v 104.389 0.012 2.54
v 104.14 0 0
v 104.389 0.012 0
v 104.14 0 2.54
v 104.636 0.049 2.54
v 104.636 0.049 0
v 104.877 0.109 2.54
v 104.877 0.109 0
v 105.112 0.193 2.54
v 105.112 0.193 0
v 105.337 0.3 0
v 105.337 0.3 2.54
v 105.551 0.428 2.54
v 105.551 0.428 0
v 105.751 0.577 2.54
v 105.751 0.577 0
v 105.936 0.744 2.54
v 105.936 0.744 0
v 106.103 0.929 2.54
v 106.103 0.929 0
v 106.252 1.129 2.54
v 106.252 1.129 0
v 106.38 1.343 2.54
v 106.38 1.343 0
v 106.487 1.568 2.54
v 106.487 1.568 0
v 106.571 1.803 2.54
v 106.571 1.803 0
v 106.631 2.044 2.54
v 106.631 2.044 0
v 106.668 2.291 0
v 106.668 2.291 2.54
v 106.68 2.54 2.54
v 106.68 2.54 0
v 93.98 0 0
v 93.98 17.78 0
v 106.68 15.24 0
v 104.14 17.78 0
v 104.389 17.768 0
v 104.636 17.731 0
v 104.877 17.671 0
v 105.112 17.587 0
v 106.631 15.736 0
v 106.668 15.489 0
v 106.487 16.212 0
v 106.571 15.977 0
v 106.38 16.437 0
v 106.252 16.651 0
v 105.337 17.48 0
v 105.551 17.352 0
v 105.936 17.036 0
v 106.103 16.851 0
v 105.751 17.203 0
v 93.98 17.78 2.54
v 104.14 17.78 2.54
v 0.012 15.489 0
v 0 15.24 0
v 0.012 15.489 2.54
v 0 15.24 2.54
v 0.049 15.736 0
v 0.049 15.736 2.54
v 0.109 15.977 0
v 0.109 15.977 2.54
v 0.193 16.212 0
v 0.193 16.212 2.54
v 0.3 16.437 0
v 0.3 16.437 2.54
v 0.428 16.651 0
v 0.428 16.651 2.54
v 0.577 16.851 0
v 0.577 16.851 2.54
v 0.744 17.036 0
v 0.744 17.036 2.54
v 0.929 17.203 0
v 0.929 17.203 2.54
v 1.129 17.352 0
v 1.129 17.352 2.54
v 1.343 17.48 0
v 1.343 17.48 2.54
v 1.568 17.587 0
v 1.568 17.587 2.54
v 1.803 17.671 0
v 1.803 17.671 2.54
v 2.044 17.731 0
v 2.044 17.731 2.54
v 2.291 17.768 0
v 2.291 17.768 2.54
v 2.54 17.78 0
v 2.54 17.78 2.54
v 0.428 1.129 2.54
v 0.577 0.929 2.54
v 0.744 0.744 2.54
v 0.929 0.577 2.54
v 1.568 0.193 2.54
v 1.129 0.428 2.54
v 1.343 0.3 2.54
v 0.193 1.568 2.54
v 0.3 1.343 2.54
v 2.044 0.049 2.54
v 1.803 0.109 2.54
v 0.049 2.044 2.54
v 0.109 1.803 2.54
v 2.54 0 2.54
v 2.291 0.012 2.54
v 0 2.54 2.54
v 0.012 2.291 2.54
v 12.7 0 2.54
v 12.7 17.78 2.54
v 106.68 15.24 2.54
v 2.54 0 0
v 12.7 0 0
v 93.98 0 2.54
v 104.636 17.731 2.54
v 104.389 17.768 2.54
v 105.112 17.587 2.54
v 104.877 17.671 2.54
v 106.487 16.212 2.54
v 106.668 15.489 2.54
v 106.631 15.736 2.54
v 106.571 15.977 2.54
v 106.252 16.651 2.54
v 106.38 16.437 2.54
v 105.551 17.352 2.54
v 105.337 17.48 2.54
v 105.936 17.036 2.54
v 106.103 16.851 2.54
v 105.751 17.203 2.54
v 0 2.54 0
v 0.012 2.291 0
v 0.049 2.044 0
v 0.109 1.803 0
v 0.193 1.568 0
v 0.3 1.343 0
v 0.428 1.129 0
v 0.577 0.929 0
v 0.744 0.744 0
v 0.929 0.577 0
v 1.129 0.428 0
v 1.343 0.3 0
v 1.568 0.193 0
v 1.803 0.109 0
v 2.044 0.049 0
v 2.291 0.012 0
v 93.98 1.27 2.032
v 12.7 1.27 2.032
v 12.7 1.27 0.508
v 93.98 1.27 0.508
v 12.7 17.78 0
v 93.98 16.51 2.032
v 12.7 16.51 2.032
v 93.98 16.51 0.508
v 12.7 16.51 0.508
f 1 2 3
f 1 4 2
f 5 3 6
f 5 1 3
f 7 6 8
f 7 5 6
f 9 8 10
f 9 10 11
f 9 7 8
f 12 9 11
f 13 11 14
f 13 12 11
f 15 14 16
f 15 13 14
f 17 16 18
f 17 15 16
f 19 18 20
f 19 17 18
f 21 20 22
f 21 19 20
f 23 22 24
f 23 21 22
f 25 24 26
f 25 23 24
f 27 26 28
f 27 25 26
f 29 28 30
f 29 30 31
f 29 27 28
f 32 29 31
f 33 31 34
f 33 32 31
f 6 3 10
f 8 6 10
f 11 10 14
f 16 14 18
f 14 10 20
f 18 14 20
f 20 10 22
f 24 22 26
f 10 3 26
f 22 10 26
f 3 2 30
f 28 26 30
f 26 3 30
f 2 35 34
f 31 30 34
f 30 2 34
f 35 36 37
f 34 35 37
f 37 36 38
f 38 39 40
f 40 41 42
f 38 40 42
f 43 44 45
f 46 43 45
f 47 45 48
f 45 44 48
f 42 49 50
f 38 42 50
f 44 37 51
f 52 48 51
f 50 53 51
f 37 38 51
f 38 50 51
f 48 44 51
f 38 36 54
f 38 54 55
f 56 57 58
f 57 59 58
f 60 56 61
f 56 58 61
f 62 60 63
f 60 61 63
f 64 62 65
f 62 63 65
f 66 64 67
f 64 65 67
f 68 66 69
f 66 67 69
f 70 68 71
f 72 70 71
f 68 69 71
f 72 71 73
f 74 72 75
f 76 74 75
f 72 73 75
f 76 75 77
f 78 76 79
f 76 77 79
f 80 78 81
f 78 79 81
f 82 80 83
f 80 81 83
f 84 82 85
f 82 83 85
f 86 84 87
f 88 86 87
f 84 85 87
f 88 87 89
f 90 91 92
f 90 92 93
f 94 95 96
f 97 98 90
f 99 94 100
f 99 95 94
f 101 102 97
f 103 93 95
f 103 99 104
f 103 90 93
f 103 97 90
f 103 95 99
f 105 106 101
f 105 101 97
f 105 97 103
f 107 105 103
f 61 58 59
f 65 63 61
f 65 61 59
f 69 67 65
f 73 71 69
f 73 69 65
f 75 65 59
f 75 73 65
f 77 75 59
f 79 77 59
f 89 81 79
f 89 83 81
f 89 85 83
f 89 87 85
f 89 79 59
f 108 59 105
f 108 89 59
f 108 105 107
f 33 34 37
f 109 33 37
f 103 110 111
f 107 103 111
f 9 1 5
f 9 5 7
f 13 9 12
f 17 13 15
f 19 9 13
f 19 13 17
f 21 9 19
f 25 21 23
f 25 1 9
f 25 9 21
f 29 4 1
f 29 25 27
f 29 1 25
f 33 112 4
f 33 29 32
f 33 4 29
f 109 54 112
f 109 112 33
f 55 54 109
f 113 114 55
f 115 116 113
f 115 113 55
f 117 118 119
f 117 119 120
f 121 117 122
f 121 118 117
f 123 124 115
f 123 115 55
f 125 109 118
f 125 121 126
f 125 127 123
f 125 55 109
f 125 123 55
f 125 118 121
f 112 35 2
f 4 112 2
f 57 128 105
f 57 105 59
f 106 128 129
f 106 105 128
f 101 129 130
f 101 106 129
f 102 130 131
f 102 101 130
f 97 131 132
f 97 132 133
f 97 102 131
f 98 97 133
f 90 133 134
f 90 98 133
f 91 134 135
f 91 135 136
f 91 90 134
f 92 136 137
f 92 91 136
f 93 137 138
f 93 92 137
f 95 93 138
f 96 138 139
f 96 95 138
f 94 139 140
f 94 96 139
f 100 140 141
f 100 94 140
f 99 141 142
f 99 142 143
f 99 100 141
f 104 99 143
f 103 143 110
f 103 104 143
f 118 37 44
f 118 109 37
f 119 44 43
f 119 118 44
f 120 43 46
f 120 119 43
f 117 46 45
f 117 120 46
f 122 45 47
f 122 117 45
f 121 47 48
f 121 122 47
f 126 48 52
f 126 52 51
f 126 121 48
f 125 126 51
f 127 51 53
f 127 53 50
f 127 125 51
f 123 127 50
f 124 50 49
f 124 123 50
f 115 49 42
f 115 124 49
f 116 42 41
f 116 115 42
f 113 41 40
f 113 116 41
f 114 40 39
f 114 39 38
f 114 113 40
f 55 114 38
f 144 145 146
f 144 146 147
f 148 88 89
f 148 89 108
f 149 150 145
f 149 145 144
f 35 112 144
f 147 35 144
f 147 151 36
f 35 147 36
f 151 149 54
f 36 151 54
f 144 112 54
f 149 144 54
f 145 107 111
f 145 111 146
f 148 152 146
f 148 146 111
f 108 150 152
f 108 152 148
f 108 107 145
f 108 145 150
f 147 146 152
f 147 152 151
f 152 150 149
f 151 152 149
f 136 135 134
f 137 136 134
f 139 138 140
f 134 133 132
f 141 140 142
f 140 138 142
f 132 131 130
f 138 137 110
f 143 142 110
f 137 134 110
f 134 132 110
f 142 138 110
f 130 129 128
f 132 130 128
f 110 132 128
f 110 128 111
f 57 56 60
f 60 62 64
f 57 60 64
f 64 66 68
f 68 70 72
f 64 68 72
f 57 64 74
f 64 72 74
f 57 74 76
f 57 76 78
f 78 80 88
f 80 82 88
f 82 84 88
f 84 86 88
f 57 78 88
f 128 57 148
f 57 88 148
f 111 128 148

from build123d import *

# Parameters (mm, degrees)
F0_W     = 106.68
F0_H     = 17.78
F1_DEPTH = 2.54
F2_R     = 2.54
F3_W     = 81.28
F3_H     = 1.27
F4_DEPTH = 25.4
F5_W     = 81.28
F5_H     = 15.24
F6_DEPTH = 0.508
F7_W     = 81.28
F7_H     = 16.51
F8_DEPTH = 0.508


with BuildPart() as f1:
    # F0 (on Top) → F1 (new body)
    with BuildSketch(Plane.XY):
        with Locations((53.34, 8.89)):
            Rectangle(F0_W, F0_H)
    extrude(amount=F1_DEPTH)

    # F2
    f2_edges = [f1.edges().sort_by_distance(p)[0] for p in [
        (106.68, 17.78, 1.27),
        (106.68, 0, 1.27),
        (0, 17.78, 1.27),
        (0, 0, 1.27),
    ]]
    fillet(f2_edges, radius=F2_R)

    # F3 (on face) → F4 (cut)
    with BuildSketch(Plane.XY.offset(2.54)):
        with Locations((53.34, 17.145)):
            Rectangle(F3_W, F3_H)
        with Locations((53.34, 0.635)):
            Rectangle(F3_W, F3_H)
    extrude(amount=-F4_DEPTH, mode=Mode.SUBTRACT)

    # F5 (on face) → F6 (cut)
    with BuildSketch(Plane.XY.offset(2.54)):
        with Locations((53.34, 8.89)):
            Rectangle(F5_W, F5_H)
    extrude(amount=-F6_DEPTH, mode=Mode.SUBTRACT)

    # F7 (on face) → F8 (cut)
    with BuildSketch(Plane(origin=(0, 0, 0), x_dir=(1, 0, 0), z_dir=(0, 0, -1))):
        with Locations((53.34, -8.255)):
            Rectangle(F7_W, F7_H)
    extrude(amount=-F8_DEPTH, mode=Mode.SUBTRACT)


solid = f1.part
